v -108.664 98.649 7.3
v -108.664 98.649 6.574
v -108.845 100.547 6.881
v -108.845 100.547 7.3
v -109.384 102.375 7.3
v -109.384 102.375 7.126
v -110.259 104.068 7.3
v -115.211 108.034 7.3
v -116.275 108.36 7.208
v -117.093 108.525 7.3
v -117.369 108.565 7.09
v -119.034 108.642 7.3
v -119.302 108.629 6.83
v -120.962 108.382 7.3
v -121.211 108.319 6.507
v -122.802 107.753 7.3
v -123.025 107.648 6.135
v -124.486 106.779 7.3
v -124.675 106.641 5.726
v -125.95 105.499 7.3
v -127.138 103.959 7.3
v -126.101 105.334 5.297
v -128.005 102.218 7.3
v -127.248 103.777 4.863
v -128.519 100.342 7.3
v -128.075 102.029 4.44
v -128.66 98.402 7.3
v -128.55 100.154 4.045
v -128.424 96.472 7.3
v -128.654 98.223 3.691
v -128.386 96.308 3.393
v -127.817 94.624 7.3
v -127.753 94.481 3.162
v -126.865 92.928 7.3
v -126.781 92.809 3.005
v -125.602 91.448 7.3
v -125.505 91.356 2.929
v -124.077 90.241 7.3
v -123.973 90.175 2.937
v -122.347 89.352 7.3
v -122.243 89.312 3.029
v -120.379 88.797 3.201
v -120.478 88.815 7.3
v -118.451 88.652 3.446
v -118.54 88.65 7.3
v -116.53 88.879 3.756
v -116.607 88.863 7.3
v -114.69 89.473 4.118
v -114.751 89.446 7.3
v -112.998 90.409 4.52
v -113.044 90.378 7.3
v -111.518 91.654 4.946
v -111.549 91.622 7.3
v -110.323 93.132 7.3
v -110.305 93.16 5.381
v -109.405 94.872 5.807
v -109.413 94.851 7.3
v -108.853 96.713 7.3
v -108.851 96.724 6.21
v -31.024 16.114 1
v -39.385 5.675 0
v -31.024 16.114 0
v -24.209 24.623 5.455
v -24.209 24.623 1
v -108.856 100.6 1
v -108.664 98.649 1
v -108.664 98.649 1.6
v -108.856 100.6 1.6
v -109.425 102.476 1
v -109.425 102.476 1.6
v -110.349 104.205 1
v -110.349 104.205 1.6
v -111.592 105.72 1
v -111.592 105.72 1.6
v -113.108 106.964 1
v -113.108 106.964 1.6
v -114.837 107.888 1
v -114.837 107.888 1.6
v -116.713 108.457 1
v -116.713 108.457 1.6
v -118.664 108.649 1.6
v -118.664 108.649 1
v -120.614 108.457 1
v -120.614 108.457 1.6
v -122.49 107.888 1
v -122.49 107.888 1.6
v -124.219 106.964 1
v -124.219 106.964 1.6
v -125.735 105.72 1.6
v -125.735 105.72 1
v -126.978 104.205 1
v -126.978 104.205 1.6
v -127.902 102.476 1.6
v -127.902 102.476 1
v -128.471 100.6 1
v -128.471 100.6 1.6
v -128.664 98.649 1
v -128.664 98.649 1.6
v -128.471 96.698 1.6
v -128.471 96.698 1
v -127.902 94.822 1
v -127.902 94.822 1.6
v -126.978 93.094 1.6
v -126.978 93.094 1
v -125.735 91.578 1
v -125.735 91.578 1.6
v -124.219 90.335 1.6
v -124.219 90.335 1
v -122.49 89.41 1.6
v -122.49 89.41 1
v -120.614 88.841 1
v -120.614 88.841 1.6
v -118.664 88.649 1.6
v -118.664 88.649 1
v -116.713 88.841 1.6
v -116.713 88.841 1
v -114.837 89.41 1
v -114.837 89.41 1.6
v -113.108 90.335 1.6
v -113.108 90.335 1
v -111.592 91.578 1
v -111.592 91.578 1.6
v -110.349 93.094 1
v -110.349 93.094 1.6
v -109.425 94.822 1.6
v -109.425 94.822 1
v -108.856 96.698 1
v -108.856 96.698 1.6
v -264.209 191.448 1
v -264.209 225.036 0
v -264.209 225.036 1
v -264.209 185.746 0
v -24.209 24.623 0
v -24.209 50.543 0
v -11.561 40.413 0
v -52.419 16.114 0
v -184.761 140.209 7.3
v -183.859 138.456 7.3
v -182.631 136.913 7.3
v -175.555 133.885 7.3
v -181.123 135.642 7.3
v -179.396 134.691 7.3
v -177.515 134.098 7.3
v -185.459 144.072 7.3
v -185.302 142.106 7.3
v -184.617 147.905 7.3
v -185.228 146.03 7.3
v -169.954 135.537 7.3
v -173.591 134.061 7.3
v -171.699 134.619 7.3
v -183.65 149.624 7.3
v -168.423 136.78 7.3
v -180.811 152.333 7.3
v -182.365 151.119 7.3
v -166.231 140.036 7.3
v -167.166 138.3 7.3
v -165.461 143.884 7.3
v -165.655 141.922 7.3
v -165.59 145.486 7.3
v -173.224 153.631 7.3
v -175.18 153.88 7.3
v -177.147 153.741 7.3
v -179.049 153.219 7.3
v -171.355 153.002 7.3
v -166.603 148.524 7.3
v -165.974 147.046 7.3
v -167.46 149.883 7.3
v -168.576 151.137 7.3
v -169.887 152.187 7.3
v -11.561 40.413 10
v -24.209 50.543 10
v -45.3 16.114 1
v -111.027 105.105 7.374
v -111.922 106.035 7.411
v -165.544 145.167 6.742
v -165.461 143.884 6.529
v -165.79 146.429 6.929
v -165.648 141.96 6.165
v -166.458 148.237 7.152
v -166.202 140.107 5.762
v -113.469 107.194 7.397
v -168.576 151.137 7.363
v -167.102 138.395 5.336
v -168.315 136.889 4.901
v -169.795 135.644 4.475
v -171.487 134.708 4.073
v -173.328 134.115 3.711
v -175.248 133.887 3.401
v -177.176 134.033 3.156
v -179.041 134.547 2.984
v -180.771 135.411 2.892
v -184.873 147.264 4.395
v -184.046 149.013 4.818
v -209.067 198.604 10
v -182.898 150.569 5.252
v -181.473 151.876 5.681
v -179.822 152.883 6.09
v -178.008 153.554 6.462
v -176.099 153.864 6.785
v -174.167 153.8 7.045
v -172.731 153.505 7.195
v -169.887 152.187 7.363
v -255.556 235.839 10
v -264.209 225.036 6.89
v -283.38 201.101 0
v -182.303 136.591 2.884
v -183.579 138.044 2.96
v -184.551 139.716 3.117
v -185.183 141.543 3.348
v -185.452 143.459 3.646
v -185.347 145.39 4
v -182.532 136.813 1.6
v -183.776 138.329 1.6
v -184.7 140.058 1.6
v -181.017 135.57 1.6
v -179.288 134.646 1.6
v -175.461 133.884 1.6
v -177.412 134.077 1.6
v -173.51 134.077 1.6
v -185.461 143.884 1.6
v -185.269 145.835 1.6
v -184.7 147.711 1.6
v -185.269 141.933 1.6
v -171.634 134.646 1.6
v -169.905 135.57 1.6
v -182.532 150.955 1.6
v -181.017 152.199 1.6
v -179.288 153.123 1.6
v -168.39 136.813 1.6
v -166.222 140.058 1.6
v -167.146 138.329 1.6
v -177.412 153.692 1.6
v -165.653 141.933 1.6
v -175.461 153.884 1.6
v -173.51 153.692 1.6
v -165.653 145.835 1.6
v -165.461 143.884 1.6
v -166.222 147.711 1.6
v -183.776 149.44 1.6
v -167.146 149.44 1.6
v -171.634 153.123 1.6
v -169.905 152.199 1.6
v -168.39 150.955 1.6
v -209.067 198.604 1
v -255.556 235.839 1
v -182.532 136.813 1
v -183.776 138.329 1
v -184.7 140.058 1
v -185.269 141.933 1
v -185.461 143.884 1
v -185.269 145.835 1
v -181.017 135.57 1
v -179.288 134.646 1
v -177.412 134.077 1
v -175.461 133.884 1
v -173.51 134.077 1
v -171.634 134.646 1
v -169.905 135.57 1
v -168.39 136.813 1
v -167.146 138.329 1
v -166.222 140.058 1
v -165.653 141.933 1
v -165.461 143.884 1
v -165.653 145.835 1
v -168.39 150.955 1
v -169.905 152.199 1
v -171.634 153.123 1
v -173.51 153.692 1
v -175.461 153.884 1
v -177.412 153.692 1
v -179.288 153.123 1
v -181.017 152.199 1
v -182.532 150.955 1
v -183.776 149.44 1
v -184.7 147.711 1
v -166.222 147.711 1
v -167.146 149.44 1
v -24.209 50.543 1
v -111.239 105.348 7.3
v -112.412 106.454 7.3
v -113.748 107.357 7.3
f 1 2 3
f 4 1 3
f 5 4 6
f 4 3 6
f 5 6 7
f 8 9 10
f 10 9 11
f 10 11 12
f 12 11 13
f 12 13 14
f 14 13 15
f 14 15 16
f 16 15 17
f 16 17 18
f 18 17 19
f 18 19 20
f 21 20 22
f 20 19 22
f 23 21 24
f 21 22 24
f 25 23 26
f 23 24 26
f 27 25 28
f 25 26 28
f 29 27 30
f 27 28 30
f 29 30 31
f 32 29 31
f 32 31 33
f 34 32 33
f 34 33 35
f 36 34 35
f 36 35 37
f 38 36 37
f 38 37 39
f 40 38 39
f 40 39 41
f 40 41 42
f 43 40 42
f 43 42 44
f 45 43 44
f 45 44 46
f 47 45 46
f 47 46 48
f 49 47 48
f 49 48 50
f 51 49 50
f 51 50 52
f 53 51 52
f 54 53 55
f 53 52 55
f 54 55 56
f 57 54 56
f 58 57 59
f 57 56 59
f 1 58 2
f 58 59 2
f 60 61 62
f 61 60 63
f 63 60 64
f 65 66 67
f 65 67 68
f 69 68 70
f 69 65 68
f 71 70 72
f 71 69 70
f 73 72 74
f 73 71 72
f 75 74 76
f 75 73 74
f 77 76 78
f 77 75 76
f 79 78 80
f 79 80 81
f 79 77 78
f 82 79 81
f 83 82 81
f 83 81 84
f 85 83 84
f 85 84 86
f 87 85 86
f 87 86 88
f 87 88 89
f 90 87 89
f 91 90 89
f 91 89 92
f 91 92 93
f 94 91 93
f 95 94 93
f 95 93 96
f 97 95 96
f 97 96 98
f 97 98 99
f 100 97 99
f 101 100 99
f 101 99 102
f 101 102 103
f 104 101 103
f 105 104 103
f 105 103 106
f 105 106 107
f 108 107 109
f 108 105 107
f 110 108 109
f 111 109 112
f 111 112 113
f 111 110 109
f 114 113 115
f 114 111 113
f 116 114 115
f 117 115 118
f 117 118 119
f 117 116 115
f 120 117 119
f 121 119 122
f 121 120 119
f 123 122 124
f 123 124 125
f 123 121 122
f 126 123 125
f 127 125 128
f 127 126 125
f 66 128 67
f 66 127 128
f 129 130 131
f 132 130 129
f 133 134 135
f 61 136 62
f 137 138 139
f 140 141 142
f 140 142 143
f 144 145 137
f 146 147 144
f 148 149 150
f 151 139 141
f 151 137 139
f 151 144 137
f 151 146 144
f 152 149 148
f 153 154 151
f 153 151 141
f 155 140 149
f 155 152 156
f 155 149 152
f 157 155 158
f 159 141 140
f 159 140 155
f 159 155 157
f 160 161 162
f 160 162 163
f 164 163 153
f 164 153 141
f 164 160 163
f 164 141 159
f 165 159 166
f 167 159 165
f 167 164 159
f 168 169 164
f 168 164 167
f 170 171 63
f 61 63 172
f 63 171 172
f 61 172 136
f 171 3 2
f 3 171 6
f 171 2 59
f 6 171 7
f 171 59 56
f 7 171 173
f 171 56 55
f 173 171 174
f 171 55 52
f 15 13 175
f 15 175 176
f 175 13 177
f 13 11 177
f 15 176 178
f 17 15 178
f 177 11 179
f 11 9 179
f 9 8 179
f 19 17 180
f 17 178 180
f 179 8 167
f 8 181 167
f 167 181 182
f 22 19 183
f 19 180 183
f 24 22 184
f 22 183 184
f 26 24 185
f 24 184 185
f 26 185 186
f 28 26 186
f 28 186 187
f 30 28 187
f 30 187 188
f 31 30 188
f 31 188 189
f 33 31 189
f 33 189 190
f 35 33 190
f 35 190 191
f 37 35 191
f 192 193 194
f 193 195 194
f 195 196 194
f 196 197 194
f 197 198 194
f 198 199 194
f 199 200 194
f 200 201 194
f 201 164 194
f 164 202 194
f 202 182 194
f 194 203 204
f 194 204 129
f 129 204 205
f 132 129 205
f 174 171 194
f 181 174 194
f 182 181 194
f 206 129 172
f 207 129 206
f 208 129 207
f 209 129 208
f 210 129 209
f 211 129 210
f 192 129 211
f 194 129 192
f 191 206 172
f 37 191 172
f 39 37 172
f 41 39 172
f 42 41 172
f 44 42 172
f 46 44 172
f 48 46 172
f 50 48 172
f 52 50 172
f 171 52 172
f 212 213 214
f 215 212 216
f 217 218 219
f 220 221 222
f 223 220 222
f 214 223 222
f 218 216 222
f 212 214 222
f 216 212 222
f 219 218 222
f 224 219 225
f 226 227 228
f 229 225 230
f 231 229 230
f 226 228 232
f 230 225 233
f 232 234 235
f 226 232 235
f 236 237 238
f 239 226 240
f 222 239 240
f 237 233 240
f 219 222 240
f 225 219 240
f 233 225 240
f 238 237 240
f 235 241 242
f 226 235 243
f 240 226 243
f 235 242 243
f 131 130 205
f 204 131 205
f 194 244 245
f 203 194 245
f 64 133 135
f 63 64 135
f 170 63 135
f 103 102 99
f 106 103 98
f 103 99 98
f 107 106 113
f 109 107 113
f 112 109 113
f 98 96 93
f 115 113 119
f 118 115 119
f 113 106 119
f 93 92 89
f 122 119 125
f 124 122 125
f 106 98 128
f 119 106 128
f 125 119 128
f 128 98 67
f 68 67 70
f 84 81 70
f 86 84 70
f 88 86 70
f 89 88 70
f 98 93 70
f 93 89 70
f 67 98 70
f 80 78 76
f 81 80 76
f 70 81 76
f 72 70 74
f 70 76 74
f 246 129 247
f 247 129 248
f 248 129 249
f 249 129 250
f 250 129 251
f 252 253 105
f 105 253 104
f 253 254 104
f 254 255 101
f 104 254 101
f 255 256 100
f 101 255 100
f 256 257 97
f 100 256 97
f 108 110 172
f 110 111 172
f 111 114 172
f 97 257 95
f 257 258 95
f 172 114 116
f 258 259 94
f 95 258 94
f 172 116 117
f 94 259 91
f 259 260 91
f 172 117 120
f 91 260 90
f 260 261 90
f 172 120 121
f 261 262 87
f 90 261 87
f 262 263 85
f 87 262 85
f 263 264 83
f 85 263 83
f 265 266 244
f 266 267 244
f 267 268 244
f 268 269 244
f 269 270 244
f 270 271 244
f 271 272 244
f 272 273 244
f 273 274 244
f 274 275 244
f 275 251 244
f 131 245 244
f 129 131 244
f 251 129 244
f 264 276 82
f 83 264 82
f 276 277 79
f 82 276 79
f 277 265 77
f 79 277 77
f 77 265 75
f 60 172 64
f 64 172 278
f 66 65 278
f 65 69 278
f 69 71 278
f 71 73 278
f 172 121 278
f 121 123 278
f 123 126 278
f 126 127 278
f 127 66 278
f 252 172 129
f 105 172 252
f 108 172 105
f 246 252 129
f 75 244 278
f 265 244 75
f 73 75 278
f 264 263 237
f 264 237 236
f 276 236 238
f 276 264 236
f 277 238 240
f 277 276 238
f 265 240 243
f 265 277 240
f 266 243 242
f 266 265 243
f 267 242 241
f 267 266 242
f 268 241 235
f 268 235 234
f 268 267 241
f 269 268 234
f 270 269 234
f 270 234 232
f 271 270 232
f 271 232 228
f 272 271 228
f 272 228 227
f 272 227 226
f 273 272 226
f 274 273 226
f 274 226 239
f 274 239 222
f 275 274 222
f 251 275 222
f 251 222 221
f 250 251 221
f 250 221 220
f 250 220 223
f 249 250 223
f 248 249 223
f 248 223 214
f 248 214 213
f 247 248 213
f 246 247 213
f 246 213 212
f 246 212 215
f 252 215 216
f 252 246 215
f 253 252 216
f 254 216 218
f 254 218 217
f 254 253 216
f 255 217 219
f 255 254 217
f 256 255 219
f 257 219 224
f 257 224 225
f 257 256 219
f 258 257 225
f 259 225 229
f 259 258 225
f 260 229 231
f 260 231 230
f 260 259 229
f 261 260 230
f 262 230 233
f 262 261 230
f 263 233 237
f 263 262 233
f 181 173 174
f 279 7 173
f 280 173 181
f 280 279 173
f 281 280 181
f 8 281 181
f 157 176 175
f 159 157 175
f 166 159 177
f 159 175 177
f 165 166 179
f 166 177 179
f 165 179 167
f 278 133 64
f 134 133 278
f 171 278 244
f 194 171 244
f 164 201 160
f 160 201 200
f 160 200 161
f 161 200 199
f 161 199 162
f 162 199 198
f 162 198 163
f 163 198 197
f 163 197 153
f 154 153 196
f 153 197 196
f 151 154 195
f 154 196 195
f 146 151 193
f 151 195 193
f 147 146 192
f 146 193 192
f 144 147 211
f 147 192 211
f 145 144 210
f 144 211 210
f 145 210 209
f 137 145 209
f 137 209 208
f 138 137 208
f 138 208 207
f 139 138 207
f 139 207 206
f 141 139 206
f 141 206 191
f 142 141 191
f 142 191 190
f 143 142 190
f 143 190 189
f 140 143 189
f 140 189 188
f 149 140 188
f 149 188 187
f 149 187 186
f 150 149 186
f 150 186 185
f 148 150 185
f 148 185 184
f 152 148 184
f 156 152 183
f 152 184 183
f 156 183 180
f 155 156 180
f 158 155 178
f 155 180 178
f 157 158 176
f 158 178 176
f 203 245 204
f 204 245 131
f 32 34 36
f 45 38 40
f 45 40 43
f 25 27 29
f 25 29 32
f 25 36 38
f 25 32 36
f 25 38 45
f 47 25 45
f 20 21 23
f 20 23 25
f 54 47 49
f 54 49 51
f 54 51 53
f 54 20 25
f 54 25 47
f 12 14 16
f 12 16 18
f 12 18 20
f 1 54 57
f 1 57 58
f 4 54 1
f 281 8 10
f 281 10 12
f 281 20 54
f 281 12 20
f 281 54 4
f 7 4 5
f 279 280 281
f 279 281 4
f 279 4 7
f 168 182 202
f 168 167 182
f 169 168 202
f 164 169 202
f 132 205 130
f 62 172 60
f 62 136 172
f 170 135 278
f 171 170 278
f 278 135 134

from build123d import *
from build123d import SkipClean  # not in build123d's __all__

# Parameters (mm, degrees)
F0_R     = 10
F1_DEPTH = 10
F2_DEPTH = 1
F4_DEPTH = 345
F5_DEPTH = 7.3
F6_DEPTH = 1.6


with BuildPart() as f1:
    # F0 (on Top) → F1 (new body)
    with BuildSketch(Plane.XY):
        Polygon((-255.5560874402, 235.83927431), (-264.2086340252, 225.0363213116), (-264.2086340252, 185.7455475346), (-236.384913462, 220.4842620314), align=None)
        Polygon((-264.2086340252, 185.7455475346), (-264.2086340252, 225.0363213116), (-283.3798080034, 201.1005598132), align=None)
        Polygon((-236.384913462, 220.4842620314), (-264.2086340252, 185.7455475346), (-236.8907927142, 163.8655213438), (-209.0670721511, 198.6042358405), align=None)
        Polygon((-209.0670721511, 198.6042358405), (-236.8907927142, 163.8655213438), (-108.6030207612, 61.1143640196), (-80.779300198, 95.8530785163), align=None)
        with Locations((-175.4610245732, 143.8843668861)):
            Circle(F0_R, mode=Mode.SUBTRACT)
        with Locations((-118.6635494232, 98.6492335796)):
            Circle(F0_R, mode=Mode.SUBTRACT)
        Polygon((-80.779300198, 95.8530785163), (-108.6030207612, 61.1143640196), (-52.4192279143, 16.1143640196), (-31.023575784, 16.1143640196), (-24.2086340252, 24.6230145983), (-24.2086340252, 50.5432151414), align=None)
        Polygon((-11.5613729408, 40.4134834171), (-24.2086340252, 50.5432151414), (-24.2086340252, 24.6230145983), align=None)
        Polygon((-31.023575784, 16.1143640196), (-52.4192279143, 16.1143640196), (-39.385093504, 5.6747689203), align=None)
    extrude(amount=F1_DEPTH)

    # F0 (on Top) → F2 (cut)
    with BuildSketch(Plane.XY):
        Polygon((-255.5560874402, 235.83927431), (-264.2086340252, 225.0363213116), (-264.2086340252, 185.7455475346), (-236.384913462, 220.4842620314), align=None)
        Polygon((-236.384913462, 220.4842620314), (-264.2086340252, 185.7455475346), (-236.8907927142, 163.8655213438), (-209.0670721511, 198.6042358405), align=None)
        Polygon((-209.0670721511, 198.6042358405), (-236.8907927142, 163.8655213438), (-108.6030207612, 61.1143640196), (-80.779300198, 95.8530785163), align=None)
        with Locations((-175.4610245732, 143.8843668861)):
            Circle(F0_R, mode=Mode.SUBTRACT)
        with Locations((-118.6635494232, 98.6492335796)):
            Circle(F0_R, mode=Mode.SUBTRACT)
        Polygon((-80.779300198, 95.8530785163), (-108.6030207612, 61.1143640196), (-52.4192279143, 16.1143640196), (-31.023575784, 16.1143640196), (-24.2086340252, 24.6230145983), (-24.2086340252, 50.5432151414), align=None)
    extrude(amount=F2_DEPTH, mode=Mode.SUBTRACT)

    # F3 (on face) → F4 (cut)
    with BuildSketch(Plane(origin=(-270.7568290083, 216.860711746, 0), x_dir=(-0.6251436055, -0.7805097517, 0), z_dir=(-0.7805097517, 0.6251436055, 0))):
        Polygon((20.192126873, 10), (-24.3155995446, 10), (20.192126873, 0), align=None)
        Polygon((-17.6889132261, 39.4938741719), (-24.3155995446, 10), (20.192126873, 10), (20.192126873, 0), (26.8188131915, 29.4938741719), align=None)
    extrude(amount=-F4_DEPTH, mode=Mode.SUBTRACT)

    # F0 (on Top) → F5 (join)
    with BuildSketch(Plane.XY):
        with Locations((-175.4610245732, 143.8843668861)):
            Circle(F0_R)
        with Locations((-118.6635494232, 98.6492335796)):
            Circle(F0_R)
    with SkipClean():  # cleaning this boolean's faces spoils the solid; the shape is the same uncleaned
        extrude(amount=F5_DEPTH)

    # F0 (on Top) → F6 (cut)
    with BuildSketch(Plane.XY):
        with Locations((-118.6635494232, 98.6492335796)):
            Circle(F0_R)
        with Locations((-175.4610245732, 143.8843668861)):
            Circle(F0_R)
    with SkipClean():  # cleaning this boolean's faces spoils the solid; the shape is the same uncleaned
        extrude(amount=F6_DEPTH, mode=Mode.SUBTRACT)


solid = f1.part
